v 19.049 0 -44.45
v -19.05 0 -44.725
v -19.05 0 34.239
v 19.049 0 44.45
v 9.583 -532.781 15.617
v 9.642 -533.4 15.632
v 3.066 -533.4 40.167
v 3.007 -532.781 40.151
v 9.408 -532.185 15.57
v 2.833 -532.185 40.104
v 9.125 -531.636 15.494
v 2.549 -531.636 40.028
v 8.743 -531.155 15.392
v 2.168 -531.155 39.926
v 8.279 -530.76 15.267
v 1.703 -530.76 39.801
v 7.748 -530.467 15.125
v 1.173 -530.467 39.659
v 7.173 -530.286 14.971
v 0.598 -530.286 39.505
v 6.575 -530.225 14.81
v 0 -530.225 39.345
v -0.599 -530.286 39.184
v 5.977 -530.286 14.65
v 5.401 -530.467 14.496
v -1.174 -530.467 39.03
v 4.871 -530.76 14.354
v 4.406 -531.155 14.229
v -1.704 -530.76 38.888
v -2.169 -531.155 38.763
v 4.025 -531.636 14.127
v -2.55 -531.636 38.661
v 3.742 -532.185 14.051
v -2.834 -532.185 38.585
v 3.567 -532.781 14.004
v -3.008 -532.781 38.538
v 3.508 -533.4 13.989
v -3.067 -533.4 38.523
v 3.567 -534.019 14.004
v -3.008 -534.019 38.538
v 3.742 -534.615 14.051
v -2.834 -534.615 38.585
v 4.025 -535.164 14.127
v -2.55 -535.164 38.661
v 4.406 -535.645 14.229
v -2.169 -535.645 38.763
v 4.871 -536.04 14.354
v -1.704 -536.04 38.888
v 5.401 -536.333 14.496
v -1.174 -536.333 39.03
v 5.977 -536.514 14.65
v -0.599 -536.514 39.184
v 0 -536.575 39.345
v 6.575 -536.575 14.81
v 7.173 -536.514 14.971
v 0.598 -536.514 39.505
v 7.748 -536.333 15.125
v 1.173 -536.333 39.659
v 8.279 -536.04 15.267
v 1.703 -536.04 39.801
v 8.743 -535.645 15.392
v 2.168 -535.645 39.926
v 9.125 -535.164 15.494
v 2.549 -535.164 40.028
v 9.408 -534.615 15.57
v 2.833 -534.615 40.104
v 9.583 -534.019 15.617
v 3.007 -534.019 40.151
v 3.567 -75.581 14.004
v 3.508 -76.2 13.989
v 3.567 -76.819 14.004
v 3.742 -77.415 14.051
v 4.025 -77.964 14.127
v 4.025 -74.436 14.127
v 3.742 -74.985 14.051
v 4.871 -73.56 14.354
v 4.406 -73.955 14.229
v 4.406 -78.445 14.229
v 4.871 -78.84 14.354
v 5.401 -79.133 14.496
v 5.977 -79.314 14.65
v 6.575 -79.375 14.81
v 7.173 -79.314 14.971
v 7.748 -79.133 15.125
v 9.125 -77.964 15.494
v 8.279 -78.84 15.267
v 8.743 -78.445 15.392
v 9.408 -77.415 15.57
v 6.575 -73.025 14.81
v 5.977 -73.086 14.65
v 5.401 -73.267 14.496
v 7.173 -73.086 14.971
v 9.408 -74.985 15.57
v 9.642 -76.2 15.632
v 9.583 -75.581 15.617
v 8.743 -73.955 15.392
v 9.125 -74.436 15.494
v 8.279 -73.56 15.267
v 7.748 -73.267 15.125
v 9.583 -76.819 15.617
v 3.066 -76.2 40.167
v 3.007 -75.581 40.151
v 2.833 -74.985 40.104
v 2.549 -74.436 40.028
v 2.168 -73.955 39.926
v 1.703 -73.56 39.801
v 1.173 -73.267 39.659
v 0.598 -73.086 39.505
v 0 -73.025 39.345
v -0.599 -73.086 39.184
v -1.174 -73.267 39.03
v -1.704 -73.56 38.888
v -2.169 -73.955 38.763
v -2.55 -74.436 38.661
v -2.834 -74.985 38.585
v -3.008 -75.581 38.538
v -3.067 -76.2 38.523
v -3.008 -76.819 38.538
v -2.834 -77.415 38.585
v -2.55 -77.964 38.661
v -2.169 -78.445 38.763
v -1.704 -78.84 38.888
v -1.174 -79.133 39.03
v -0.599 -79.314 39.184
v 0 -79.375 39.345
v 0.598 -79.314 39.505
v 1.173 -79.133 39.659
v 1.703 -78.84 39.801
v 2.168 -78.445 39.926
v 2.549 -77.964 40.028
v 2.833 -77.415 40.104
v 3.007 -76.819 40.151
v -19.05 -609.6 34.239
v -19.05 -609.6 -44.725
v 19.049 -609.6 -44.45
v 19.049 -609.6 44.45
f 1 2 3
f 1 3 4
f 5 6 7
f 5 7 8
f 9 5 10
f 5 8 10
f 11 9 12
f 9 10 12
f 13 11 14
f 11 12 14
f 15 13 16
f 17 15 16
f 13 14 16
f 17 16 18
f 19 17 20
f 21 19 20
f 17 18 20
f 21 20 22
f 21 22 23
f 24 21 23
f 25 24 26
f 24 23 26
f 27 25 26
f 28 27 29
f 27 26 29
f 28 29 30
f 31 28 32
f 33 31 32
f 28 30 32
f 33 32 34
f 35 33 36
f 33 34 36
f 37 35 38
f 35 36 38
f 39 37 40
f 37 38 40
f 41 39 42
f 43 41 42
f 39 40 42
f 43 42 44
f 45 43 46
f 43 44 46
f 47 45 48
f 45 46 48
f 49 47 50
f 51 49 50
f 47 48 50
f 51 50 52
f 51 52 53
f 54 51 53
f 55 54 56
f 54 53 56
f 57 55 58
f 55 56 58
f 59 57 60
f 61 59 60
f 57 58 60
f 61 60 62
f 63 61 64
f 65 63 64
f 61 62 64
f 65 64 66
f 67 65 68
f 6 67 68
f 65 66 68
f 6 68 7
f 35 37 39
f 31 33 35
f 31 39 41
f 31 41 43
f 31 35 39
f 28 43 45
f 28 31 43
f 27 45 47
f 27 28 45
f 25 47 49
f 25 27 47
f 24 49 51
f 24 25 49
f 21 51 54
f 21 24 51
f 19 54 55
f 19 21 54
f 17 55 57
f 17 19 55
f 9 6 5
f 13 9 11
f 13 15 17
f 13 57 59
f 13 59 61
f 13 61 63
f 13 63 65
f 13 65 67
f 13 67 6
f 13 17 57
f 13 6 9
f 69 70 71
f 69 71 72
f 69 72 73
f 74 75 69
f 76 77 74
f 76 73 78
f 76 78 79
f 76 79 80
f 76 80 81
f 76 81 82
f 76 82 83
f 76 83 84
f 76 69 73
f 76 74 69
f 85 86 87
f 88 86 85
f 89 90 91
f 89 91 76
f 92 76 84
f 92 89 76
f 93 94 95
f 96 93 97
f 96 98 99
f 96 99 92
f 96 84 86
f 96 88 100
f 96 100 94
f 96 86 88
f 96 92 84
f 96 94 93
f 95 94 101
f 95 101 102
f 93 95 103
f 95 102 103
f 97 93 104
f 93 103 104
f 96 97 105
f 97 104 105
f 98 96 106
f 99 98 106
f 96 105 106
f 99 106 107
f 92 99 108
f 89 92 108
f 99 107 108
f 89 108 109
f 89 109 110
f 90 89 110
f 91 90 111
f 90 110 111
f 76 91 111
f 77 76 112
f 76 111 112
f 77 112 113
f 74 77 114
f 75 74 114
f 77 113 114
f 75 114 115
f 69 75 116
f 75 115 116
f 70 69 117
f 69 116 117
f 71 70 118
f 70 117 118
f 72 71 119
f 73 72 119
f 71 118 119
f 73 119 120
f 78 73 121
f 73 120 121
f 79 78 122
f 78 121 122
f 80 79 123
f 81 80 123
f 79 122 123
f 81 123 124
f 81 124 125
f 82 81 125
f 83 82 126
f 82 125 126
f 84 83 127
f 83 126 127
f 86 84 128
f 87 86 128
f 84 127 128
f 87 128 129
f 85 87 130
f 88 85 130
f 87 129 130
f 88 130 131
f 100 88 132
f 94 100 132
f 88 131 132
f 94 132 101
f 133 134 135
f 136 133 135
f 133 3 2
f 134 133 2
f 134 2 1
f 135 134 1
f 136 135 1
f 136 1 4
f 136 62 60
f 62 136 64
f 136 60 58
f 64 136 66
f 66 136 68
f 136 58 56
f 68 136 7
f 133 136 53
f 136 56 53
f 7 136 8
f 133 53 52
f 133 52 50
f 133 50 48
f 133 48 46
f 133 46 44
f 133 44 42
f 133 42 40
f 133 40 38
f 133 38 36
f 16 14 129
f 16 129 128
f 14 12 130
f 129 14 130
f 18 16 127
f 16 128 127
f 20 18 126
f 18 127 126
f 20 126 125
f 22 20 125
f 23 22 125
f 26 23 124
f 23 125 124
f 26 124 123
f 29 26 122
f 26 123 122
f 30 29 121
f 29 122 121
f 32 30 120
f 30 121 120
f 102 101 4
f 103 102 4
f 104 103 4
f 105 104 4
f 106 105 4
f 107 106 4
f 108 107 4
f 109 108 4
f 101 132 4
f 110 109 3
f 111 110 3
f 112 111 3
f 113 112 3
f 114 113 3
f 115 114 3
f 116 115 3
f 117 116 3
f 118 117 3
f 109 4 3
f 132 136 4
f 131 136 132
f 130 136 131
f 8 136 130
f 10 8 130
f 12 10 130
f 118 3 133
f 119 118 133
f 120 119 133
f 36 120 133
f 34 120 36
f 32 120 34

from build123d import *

# Parameters (mm, degrees)
F1_DEPTH = 609.6
F3_R     = 3.175
F4_DEPTH = 25.4


with BuildPart() as f1:
    # F0 (on Front) → F1 (new body)
    with BuildSketch(Plane.XZ):
        Polygon((-19.05, -44.7250839726), (19.0490069268, -44.45), (19.0490069268, 44.45), (-19.05, 34.2392), align=None)
    extrude(amount=F1_DEPTH)

    # F3 (on face) → F4 (cut)
    with BuildSketch(Plane(origin=(-9.8380204896, 0, 36.7080748598), x_dir=(0.9659118691, 0, 0.2588711284), z_dir=(-0.2588711284, 0, 0.9659118691))):
        with Locations((10.1847013869, -76.2)):
            Circle(F3_R)
        with Locations((10.1847013869, -533.4)):
            Circle(F3_R)
    extrude(amount=-F4_DEPTH, mode=Mode.SUBTRACT)


solid = f1.part
